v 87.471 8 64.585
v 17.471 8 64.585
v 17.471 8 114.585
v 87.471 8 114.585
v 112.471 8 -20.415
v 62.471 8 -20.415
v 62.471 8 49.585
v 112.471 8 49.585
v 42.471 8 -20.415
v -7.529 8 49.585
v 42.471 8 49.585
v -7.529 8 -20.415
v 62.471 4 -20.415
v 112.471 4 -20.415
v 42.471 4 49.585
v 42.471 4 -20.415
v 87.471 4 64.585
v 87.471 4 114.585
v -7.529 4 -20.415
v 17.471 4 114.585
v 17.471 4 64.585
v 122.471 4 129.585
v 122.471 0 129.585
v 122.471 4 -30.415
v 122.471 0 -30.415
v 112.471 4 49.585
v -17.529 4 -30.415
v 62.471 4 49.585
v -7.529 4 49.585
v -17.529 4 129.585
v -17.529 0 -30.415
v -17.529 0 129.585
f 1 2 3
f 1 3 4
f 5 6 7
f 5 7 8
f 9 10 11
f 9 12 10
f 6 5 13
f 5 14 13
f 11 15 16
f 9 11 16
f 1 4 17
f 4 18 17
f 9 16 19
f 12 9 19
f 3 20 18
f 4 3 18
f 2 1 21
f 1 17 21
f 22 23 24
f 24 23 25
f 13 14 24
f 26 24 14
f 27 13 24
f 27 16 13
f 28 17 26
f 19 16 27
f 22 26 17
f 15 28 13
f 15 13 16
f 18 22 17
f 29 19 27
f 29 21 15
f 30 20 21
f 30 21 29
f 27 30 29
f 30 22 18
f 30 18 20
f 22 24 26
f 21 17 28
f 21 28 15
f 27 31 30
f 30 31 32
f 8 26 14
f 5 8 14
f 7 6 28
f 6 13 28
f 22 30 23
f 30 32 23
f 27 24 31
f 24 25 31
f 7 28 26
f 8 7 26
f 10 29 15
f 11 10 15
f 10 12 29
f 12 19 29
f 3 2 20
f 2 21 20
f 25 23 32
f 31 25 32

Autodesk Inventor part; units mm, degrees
ref_plane "YZ Plane" through (0, 0, 0) normal (1, 0, 0) x (0, 1, 0)
ref_plane "XZ Plane" through (0, 0, 0) normal (0, 1, 0) x (-1, 0, 0)
ref_plane "XY Plane" through (0, 0, 0) normal (0, 0, 1) x (1, 0, 0)
sketch "Sketch1" plane through (0, 0, 0) normal (0, 1, 0) x (-1, 0, 0)
  line L0 (17.529, 129.5854) -> (-122.471, 129.5854)
  line L1 (-122.471, 129.5854) -> (-122.471, -30.4146)
  line L2 (-122.471, -30.4146) -> (17.529, -30.4146)
  line L3 (17.529, -30.4146) -> (17.529, 129.5854)
  point P0 (0, 0)
  dimension "d0" = 160
  dimension "d1" = 140
extrude "Extrusion1" add sketch "Sketch1" along normal blind 4
sketch "Sketch2" plane through (0, 4, 0) normal (0, 1, 0) x (1, 0, 0)
  point P0 (0, 0)
sketch "Sketch3" plane through (0, 4, 0) normal (0, 1, 0) x (1, 0, 0)
  line L0 (17.471, -114.5854) -> (87.471, -114.5854)
  line L1 (87.471, -114.5854) -> (87.471, -64.5854)
  line L2 (87.471, -64.5854) -> (17.471, -64.5854)
  line L3 (17.471, -64.5854) -> (17.471, -114.5854)
  line L4 (-7.529, -49.5854) -> (42.471, -49.5854)
  line L5 (42.471, -49.5854) -> (42.471, 20.4146)
  line L6 (42.471, 20.4146) -> (-7.529, 20.4146)
  line L7 (-7.529, 20.4146) -> (-7.529, -49.5854)
  line L8 (62.471, -49.5854) -> (112.471, -49.5854)
  line L9 (112.471, -49.5854) -> (112.471, 20.4146)
  line L10 (112.471, 20.4146) -> (62.471, 20.4146)
  line L11 (62.471, 20.4146) -> (62.471, -49.5854)
  line L12 (-17.529, -129.5854) -> (122.471, -129.5854) projected
  line L13 (-17.529, 30.4146) -> (-17.529, -129.5854) projected
  line L14 (122.471, 30.4146) -> (-17.529, 30.4146) projected
  line L15 (122.471, -129.5854) -> (122.471, 30.4146) projected
  point P0 (0, 0)
  dimension "d4" = 50
  dimension "d5" = 70
  dimension "d6" = 50
  dimension "d7" = 50
  dimension "d8" = 70
  dimension "d9" = 70
  dimension "d10" = 15
  dimension "d11" = 10
  dimension "d12" = 10
  dimension "d13" = 10
  dimension "d14" = 10
  dimension "d15" = 35
  dimension "d16" = 35
extrude "Extrusion2" add sketch "Sketch3" along normal blind 4 contours L3 L2 L1 L0 | L7 L6 L5 L4 | L11 L10 L9 L8
properties part number "Stage with Boards"
